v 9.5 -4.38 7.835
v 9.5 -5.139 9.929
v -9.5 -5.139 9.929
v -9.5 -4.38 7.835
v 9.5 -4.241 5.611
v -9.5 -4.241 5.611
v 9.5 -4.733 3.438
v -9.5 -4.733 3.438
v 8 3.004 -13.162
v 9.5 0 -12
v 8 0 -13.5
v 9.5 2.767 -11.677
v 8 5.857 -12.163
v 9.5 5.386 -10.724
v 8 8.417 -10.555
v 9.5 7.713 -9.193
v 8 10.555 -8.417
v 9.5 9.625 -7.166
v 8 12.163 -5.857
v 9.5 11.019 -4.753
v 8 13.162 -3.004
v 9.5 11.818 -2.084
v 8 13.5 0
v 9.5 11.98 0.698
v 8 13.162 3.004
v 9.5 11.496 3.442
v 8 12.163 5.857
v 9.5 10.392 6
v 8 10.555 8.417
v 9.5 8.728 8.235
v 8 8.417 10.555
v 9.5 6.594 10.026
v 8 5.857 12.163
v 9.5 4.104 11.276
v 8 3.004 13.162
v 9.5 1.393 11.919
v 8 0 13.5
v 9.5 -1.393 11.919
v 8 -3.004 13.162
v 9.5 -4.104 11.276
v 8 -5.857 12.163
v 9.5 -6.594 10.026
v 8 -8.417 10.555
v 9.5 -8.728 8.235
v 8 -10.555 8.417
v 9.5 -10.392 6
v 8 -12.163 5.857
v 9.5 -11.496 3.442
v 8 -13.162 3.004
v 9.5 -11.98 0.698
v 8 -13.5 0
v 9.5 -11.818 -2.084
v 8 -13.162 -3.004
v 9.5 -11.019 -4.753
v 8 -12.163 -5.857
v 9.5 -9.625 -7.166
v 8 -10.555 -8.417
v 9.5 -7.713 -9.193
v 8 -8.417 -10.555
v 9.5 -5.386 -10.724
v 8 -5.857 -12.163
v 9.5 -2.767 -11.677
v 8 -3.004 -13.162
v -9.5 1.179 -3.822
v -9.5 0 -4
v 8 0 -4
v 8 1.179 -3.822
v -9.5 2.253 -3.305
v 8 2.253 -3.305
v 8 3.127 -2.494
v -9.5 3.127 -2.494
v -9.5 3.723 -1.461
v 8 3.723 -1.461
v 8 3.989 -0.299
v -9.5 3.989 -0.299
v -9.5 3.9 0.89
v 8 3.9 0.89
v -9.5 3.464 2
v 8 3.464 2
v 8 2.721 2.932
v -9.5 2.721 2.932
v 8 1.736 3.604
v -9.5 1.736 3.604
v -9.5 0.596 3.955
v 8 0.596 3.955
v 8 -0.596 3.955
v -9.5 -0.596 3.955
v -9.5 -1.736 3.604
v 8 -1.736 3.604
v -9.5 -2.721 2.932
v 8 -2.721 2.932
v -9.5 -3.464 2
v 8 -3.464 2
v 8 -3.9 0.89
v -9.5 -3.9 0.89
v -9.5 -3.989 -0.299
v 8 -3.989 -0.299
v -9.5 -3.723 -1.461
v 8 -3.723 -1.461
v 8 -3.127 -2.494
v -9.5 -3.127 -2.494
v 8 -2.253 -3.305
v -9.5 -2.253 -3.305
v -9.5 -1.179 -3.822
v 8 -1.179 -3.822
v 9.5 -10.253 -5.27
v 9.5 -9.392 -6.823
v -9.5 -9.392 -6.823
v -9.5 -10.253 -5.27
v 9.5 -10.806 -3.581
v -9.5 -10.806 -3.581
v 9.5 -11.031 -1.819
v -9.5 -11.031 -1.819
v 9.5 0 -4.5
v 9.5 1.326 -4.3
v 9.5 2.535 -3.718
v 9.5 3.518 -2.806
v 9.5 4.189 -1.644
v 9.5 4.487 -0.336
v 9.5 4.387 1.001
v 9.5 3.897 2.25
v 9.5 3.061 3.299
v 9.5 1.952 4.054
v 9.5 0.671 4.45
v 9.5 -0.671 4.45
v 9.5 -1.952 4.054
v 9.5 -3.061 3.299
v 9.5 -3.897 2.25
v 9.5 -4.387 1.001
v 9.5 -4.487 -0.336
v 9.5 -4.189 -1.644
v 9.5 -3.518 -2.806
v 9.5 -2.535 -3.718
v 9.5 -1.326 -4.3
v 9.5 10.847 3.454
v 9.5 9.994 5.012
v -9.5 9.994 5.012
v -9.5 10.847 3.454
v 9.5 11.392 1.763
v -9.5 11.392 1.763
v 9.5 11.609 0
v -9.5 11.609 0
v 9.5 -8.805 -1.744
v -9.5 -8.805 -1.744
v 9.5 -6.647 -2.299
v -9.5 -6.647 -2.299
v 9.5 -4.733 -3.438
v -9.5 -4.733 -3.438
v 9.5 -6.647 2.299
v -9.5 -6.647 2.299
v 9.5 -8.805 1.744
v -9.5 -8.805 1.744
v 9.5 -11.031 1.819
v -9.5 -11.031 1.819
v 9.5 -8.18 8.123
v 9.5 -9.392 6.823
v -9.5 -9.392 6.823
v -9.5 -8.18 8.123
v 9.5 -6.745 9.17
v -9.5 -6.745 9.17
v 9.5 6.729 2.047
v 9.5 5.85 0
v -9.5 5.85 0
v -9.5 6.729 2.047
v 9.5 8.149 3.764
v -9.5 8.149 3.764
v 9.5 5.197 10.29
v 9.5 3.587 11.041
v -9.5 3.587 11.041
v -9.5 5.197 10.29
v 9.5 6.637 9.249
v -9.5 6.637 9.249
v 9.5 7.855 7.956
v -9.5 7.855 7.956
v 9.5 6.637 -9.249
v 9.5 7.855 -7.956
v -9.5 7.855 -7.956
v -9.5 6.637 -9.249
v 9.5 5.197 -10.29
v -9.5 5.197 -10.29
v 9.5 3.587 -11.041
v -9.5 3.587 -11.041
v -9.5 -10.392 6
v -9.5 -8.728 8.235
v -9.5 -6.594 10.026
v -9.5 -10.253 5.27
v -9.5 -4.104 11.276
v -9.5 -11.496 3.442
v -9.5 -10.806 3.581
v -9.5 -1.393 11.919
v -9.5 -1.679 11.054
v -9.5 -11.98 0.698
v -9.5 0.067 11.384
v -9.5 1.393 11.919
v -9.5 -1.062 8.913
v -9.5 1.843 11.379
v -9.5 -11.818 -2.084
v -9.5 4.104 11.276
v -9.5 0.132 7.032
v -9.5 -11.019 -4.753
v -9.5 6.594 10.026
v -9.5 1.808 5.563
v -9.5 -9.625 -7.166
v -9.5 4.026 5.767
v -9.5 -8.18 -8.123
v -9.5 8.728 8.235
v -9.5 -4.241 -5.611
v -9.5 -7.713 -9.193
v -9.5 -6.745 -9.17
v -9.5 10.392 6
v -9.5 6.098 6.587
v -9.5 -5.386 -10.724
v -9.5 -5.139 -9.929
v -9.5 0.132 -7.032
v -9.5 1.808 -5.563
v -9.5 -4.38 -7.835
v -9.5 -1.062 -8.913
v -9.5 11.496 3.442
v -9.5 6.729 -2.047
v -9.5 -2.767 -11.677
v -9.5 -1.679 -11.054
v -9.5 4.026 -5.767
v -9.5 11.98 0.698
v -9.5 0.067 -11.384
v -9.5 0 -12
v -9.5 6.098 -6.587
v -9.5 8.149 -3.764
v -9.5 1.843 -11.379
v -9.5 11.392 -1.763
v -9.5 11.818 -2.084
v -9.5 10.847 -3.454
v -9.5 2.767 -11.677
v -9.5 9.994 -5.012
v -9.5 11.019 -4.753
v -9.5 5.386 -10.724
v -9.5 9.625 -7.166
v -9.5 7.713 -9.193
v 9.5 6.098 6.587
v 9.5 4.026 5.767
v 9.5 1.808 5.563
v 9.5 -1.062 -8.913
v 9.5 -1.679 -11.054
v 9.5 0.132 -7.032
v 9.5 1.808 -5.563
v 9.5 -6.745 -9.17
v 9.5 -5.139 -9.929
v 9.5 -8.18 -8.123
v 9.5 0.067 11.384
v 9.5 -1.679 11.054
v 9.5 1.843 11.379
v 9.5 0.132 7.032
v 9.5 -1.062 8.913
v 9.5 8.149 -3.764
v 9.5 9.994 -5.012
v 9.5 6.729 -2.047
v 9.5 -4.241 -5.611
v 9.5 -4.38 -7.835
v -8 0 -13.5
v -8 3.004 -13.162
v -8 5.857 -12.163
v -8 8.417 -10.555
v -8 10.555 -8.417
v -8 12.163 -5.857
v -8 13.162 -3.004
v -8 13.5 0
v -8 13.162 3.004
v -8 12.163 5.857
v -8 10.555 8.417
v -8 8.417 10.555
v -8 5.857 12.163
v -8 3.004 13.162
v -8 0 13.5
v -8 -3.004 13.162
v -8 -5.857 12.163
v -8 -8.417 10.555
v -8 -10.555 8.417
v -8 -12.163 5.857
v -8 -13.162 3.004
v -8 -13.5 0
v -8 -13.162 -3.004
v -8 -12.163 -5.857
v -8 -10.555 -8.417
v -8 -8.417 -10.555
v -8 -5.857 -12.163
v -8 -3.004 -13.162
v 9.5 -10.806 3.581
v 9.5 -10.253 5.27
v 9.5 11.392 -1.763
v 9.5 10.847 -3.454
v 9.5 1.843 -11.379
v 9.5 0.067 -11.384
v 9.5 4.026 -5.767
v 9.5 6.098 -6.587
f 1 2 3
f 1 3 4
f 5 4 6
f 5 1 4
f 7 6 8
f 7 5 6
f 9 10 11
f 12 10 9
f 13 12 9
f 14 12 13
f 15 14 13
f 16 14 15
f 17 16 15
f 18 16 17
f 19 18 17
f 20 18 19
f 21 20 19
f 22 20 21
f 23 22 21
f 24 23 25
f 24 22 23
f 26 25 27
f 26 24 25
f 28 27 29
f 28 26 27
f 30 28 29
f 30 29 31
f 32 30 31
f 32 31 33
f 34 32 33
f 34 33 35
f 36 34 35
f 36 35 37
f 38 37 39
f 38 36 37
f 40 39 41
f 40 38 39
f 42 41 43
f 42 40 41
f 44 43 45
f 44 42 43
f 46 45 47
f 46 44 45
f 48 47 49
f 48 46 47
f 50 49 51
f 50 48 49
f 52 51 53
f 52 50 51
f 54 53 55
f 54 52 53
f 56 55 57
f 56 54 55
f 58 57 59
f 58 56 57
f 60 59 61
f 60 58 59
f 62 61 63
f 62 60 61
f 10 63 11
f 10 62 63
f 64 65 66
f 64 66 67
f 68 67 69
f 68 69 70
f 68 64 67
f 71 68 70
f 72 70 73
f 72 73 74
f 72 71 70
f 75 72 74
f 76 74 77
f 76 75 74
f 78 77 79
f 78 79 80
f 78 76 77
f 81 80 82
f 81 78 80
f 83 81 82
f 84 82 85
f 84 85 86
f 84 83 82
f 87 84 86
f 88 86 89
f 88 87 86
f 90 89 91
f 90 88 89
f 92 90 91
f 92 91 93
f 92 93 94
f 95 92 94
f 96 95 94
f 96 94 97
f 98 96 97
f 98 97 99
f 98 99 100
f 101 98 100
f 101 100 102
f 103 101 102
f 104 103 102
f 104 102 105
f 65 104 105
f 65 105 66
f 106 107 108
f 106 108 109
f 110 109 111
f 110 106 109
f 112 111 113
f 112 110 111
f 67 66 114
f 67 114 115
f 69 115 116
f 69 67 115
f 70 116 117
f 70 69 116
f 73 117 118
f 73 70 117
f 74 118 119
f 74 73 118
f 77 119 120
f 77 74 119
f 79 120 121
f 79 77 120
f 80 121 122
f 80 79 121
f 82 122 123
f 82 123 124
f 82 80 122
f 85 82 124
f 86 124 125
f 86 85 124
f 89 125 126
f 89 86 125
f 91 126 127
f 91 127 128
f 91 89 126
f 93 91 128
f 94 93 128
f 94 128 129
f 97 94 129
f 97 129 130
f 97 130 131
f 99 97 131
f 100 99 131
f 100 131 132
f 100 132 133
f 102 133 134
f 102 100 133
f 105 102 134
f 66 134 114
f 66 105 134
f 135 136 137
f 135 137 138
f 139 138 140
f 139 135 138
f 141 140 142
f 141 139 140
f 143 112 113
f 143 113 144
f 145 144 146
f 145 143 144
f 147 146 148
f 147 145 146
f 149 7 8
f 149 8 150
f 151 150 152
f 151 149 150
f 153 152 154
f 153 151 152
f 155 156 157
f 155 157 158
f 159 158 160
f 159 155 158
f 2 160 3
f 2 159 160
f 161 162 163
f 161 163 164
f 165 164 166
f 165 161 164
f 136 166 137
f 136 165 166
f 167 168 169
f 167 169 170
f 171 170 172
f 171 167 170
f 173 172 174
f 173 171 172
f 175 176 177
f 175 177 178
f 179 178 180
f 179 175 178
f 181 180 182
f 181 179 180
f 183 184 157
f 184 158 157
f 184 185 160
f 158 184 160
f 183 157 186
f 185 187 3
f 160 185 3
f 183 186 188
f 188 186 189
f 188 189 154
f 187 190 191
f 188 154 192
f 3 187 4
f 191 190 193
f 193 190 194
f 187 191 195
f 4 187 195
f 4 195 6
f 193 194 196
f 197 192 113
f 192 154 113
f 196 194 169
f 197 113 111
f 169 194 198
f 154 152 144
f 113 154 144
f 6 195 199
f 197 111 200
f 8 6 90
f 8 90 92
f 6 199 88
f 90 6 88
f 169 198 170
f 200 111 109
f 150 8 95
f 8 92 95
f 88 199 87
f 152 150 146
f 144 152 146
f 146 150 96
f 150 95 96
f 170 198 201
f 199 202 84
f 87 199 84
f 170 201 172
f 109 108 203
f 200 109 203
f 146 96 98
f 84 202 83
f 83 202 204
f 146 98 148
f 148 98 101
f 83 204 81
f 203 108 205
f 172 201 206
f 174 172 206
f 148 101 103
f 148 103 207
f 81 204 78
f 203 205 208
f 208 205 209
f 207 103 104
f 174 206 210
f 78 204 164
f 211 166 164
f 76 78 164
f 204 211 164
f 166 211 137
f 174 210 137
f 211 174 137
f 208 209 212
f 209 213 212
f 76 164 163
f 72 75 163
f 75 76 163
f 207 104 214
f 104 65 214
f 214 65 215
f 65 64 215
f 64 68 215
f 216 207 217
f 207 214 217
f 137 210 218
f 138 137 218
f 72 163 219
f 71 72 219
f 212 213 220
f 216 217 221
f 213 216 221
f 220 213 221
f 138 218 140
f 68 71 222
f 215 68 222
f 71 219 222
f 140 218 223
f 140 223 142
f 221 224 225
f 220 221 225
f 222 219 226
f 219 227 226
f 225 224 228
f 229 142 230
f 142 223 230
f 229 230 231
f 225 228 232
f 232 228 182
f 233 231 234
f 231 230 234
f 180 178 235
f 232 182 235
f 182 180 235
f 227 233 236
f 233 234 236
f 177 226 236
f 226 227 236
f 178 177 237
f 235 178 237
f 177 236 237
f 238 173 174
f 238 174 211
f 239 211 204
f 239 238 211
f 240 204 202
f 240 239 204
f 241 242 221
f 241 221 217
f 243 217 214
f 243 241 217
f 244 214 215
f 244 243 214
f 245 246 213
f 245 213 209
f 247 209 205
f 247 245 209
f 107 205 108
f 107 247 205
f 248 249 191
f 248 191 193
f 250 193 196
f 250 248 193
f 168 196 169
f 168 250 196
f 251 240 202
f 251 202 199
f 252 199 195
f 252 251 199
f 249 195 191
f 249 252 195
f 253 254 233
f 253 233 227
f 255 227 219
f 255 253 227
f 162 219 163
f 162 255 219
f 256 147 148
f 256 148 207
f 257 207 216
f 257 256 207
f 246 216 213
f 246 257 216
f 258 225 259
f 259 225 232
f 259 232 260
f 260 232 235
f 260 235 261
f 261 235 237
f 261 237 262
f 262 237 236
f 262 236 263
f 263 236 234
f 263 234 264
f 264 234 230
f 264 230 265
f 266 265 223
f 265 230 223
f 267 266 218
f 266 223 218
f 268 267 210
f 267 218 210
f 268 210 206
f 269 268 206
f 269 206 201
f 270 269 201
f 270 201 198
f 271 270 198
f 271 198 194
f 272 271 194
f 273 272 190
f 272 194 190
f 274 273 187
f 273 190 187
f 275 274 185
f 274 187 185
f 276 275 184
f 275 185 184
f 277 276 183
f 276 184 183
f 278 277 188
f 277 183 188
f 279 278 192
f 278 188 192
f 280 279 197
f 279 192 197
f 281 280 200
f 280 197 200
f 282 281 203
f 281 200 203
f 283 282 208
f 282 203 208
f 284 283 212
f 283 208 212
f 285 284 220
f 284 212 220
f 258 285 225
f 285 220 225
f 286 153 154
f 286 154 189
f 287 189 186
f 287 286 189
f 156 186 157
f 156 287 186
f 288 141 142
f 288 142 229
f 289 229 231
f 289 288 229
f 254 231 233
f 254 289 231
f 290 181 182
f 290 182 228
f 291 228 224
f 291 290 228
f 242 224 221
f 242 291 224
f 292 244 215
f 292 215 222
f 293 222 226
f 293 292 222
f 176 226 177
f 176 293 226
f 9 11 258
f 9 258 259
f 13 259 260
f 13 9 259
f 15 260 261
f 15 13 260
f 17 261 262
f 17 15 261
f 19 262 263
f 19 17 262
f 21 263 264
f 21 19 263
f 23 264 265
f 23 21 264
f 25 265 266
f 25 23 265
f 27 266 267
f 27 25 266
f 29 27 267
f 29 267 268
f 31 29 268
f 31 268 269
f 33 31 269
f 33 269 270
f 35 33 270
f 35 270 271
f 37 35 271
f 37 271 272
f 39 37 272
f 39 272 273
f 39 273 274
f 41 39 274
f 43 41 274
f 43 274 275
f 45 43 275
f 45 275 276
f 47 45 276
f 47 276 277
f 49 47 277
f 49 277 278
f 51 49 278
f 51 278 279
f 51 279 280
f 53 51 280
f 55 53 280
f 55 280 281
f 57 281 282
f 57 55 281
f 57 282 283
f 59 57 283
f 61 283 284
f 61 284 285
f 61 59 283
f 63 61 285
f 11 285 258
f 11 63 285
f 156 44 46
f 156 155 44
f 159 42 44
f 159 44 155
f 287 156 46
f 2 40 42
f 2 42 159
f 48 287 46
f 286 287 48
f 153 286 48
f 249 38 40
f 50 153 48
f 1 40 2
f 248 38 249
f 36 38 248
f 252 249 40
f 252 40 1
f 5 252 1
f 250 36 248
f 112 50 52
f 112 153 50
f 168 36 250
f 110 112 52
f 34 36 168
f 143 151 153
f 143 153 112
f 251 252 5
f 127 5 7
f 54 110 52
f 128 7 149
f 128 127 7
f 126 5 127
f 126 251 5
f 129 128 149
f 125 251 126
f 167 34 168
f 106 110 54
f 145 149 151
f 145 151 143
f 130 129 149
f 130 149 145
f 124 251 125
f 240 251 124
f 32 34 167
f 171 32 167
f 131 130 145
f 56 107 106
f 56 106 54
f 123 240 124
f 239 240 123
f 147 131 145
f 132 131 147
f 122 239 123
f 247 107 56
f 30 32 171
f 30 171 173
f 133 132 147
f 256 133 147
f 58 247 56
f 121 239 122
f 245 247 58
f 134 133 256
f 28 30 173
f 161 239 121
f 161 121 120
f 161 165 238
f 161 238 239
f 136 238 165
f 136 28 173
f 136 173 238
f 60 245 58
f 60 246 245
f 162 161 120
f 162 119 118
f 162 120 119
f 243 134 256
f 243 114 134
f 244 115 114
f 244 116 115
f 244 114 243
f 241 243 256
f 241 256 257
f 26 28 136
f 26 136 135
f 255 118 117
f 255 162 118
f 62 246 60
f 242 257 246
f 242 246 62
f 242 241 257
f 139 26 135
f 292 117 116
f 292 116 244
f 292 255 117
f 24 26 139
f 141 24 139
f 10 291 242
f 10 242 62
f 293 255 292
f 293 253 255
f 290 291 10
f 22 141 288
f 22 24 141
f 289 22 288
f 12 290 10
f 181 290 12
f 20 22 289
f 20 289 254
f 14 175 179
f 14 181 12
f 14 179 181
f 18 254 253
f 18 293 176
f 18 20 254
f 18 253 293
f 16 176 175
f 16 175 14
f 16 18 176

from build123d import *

# Parameters (mm, degrees)
SKETCH1_R           = 13.5
SKETCH1_R_2         = 4
BOSS_EXTRUDE1_DEPTH = 9.5
CUT_EXTRUDE1_DEPTH  = 22.324868112
CIRPATTERN1_COUNT   = 5
CHAMFER1_SIZE       = 1.5
CHAMFER2_SIZE       = 0.5
CHAMFER2_SIZE2      = 1.5


with BuildPart() as part:
    # Sketch1 → Boss-Extrude1 (new, symmetric)
    with BuildSketch(Plane(origin=(0, 0, 0), x_dir=(0, 0, -1), z_dir=(1, 0, 0))):
        Circle(SKETCH1_R)
        Circle(SKETCH1_R_2, mode=Mode.SUBTRACT)
    extrude(amount=BOSS_EXTRUDE1_DEPTH, both=True)

    # Sketch2 → Cut-Extrude1 (cut, symmetric)
    with BuildSketch(Plane(origin=(0, 0, 0), x_dir=(0, 0, -1), z_dir=(1, 0, 0))):
        with BuildLine():
            ThreePointArc((0, 5.849695328), (-2.956289657, 7.377375059), (-5.012219469, 9.99397715))
            ThreePointArc((-5.012219469, 9.99397715), (-2.621563936, 11.159720287), (0, 11.6087119))
            ThreePointArc((0, 11.6087119), (2.621563936, 11.159720287), (5.012219469, 9.99397715))
            ThreePointArc((5.012219469, 9.99397715), (2.956289657, 7.377375059), (0, 5.849695328))
        make_face()
    cut_extrude1 = extrude(amount=CUT_EXTRUDE1_DEPTH, both=True, mode=Mode.SUBTRACT)

    # CirPattern1: Cut-Extrude1 ×5 about axis
    cirpattern1_axis = Axis((0, 0, 0), (1, 0, 0))
    for i in range(1, CIRPATTERN1_COUNT):
        add(cut_extrude1.rotate(cirpattern1_axis, i * 360 / CIRPATTERN1_COUNT), mode=Mode.SUBTRACT)

    # Chamfer1
    chamfer1_edges = [part.edges().sort_by_distance(p)[0] for p in [
        (-9.5, 0, 13.5),
        (9.5, 0, 13.5),
    ]]
    chamfer(chamfer1_edges, length=CHAMFER1_SIZE)

    # Chamfer2
    chamfer2_edges = [part.edges().sort_by_distance(p)[0] for p in [
        (9.5, 0, 4),
    ]]
    chamfer2_side = [part.faces().sort_by_distance(p)[0] for p in [
        (9.5, 0, 11.660588745),
    ]]
    chamfer(chamfer2_edges, length=CHAMFER2_SIZE, length2=CHAMFER2_SIZE2, reference=chamfer2_side[0])


solid = part.part
